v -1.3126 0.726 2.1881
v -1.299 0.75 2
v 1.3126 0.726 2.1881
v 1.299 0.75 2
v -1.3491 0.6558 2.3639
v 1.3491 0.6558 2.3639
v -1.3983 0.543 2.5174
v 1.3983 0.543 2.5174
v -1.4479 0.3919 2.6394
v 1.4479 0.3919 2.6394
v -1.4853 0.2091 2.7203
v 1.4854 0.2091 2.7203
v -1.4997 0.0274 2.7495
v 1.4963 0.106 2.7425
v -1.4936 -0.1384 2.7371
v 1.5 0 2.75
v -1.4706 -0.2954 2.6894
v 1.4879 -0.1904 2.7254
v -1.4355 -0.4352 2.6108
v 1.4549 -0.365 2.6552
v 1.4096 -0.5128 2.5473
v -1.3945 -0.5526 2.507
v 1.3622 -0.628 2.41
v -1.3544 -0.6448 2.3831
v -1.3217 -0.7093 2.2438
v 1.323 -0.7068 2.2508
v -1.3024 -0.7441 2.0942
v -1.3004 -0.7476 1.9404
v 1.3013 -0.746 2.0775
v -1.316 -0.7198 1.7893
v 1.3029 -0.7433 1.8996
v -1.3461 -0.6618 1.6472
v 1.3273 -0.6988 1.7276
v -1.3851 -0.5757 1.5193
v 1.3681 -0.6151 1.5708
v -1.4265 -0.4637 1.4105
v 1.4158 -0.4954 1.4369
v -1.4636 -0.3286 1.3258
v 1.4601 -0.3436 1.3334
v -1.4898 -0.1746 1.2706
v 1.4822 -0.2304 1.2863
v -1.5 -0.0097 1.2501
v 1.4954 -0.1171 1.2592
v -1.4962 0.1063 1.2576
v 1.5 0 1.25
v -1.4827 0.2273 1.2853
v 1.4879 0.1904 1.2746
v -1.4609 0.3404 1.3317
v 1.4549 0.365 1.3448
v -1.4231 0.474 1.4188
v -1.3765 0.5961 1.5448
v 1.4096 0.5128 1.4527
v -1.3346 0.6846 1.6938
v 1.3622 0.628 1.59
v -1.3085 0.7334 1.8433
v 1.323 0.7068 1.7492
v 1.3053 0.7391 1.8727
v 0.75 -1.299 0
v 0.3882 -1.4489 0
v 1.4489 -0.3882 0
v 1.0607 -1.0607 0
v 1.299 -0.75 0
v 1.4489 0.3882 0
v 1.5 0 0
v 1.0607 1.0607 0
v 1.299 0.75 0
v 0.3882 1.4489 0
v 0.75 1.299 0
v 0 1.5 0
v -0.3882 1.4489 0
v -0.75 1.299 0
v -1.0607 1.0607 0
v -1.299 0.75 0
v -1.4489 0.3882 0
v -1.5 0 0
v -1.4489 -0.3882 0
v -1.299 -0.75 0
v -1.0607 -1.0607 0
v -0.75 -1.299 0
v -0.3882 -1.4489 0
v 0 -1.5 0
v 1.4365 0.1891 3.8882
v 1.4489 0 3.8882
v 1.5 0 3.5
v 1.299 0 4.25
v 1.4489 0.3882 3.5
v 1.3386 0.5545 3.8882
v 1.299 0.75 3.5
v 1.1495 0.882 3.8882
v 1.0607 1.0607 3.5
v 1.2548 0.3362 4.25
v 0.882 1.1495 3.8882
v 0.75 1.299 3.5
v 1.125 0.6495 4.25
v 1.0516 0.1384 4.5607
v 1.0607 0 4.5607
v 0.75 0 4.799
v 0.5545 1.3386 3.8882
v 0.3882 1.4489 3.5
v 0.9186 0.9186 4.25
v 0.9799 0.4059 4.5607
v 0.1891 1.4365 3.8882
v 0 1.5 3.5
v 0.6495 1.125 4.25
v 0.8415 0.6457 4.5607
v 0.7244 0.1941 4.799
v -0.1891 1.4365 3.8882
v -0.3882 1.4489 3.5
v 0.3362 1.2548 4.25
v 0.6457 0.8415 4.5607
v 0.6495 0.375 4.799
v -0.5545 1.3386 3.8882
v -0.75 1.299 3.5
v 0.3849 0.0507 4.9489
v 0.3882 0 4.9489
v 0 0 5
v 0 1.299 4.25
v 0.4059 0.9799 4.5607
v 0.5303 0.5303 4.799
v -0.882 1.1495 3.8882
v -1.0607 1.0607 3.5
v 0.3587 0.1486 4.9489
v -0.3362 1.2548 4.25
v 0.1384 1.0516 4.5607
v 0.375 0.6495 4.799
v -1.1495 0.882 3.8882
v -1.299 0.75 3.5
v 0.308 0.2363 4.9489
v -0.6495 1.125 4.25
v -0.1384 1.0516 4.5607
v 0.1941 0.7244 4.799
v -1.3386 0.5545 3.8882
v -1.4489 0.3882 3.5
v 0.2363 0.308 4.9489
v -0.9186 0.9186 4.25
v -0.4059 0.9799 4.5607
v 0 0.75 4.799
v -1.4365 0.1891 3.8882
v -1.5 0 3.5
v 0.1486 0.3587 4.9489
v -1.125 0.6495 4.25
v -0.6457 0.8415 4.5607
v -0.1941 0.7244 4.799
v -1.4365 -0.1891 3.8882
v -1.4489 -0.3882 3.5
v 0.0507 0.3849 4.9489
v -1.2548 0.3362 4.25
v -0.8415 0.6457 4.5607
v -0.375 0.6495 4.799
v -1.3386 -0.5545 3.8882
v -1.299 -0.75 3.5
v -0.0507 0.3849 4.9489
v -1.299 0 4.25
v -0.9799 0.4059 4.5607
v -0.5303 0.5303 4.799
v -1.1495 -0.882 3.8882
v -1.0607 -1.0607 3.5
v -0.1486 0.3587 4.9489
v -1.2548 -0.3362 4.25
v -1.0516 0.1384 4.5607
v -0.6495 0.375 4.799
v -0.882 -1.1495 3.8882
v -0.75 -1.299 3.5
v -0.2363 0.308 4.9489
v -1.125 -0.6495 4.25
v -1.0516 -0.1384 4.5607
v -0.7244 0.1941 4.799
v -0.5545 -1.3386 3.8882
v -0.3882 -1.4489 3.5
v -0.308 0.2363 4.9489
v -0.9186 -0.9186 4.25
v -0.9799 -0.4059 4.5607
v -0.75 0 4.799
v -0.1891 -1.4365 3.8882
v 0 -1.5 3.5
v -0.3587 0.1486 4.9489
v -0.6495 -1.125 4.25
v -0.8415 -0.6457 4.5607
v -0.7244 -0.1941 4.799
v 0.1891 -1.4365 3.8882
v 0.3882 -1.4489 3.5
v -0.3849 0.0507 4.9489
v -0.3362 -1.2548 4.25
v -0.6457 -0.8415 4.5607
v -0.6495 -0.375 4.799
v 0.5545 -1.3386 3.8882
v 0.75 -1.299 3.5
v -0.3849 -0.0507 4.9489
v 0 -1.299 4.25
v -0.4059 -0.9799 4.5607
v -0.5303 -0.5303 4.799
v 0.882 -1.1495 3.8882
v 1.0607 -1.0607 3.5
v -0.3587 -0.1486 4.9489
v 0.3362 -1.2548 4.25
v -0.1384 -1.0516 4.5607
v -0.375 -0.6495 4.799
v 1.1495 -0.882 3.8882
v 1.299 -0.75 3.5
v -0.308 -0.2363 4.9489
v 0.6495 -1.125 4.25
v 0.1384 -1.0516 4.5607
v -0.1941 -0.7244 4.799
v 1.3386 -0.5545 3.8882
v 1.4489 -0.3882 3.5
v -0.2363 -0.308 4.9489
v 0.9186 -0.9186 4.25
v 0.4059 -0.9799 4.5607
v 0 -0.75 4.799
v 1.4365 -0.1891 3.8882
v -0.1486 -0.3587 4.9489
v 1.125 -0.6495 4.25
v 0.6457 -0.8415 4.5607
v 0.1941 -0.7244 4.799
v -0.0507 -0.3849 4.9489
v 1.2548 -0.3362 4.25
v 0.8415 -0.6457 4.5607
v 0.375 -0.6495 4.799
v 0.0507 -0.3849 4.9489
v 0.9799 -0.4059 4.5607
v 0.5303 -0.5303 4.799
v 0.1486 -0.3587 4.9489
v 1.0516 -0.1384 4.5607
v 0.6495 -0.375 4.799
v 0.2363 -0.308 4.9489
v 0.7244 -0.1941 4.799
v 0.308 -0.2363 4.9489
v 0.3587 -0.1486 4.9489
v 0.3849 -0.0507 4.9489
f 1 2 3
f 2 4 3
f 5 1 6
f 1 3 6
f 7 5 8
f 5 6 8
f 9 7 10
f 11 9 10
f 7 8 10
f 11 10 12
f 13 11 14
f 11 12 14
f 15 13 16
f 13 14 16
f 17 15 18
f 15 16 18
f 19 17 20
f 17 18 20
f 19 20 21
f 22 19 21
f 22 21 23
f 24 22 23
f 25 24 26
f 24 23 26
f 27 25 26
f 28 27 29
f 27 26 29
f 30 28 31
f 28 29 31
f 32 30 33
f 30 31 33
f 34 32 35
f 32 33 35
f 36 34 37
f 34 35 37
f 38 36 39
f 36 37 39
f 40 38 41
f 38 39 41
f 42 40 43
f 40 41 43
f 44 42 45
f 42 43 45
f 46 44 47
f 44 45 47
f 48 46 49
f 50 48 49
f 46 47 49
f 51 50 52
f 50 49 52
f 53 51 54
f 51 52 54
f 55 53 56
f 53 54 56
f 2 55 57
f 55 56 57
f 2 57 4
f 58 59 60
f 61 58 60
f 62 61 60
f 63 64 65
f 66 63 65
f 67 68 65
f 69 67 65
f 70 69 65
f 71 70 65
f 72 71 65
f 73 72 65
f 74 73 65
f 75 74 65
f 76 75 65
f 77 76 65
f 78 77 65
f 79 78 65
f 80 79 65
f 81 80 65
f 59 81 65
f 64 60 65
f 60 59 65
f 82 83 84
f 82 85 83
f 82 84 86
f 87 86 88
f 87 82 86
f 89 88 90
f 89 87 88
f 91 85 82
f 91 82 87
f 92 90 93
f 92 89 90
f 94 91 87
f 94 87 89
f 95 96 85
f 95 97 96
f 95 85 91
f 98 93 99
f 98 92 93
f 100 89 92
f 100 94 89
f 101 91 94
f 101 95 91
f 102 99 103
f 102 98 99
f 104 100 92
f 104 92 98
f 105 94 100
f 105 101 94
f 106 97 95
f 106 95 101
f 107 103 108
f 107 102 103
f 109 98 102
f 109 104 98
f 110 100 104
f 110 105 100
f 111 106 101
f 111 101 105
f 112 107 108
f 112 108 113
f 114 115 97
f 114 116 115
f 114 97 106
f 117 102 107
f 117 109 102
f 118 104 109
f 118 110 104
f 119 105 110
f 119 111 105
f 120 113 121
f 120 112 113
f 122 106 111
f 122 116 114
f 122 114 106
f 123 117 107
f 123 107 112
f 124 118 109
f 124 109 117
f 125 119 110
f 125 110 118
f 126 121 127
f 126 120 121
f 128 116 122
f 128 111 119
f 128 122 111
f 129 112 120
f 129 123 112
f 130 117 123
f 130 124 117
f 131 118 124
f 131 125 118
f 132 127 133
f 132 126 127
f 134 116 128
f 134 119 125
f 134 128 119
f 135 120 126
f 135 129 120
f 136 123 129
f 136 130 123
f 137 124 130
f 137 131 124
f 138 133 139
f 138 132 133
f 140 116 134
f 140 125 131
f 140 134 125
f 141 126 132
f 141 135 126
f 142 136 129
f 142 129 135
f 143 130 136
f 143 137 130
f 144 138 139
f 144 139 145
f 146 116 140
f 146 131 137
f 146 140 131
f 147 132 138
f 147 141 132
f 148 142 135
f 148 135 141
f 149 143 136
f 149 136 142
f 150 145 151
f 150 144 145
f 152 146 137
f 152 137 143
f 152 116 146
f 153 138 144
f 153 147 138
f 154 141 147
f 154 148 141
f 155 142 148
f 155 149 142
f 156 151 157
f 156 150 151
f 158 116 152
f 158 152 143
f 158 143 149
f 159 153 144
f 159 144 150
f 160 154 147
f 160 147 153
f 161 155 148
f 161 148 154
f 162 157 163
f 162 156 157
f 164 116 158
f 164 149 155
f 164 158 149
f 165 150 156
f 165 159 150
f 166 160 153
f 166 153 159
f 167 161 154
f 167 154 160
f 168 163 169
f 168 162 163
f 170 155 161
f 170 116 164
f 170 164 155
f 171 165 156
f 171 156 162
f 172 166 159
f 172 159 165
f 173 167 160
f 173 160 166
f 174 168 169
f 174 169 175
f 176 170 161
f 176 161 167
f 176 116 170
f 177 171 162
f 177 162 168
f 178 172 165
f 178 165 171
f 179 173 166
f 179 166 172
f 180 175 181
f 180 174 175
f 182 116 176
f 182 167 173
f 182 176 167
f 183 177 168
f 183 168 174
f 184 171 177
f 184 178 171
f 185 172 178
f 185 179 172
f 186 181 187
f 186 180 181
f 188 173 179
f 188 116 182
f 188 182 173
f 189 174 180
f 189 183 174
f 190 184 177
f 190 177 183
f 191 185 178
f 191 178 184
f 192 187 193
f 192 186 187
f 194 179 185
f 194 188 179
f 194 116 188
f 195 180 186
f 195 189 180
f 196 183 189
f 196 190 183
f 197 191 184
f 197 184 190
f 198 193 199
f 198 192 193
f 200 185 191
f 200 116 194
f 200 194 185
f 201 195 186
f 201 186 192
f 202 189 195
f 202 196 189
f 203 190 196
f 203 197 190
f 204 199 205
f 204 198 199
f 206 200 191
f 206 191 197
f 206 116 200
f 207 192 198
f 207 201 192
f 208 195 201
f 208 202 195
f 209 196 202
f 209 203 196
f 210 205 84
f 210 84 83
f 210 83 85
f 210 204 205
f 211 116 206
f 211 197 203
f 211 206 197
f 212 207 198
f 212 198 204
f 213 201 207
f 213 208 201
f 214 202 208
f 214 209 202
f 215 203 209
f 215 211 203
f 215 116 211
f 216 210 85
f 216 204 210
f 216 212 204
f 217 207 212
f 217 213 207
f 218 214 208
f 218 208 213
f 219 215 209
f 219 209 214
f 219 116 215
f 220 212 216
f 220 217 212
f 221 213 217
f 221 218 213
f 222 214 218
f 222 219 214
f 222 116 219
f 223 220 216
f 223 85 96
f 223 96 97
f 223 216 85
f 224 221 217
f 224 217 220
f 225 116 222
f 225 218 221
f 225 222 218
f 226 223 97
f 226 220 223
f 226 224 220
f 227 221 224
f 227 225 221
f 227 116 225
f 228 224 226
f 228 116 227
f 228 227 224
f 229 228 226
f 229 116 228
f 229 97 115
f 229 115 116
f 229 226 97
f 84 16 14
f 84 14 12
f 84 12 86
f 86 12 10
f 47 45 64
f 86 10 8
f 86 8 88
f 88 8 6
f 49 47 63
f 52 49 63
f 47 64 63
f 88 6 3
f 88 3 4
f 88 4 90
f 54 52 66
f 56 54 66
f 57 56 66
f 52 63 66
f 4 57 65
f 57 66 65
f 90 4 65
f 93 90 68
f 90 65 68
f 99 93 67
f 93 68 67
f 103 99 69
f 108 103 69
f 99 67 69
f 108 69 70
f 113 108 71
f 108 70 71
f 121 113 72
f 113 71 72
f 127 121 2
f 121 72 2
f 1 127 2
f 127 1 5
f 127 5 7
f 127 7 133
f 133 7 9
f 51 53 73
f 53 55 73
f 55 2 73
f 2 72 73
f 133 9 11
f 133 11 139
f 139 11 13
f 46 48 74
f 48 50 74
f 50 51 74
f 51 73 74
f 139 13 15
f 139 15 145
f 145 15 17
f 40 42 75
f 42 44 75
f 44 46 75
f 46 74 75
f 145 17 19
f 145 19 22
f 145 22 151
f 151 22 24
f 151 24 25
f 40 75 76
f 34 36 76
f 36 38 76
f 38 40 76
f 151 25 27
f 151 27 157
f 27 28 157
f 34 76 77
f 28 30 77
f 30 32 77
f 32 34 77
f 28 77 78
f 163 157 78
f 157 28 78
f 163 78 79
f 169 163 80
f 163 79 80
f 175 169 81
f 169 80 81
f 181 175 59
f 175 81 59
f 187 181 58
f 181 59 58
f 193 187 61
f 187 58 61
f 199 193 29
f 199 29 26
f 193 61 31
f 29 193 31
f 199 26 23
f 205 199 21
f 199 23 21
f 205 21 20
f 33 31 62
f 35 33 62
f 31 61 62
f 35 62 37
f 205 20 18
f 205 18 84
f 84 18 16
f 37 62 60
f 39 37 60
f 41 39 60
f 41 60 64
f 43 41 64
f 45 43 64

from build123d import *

# Parameters (mm, degrees)
F0_R     = 1.5
F1_DEPTH = 5
F2_R     = 1.5
F3_R     = 0.75
F4_DEPTH = 1.5


with BuildPart() as f1:
    # F0 (on Top) → F1 (new body)
    with BuildSketch(Plane.XY):
        Circle(F0_R)
    extrude(amount=F1_DEPTH)

    # F2
    f2_edges = [f1.edges().sort_by_distance(p)[0] for p in [
        (-1.5, 0, 5),
    ]]
    fillet(f2_edges, radius=F2_R)

    # F3 (on Right) → F4 (cut, symmetric)
    with BuildSketch(Plane.YZ):
        with Locations((0, 2)):
            Circle(F3_R)
    extrude(amount=F4_DEPTH, both=True, mode=Mode.SUBTRACT)


solid = f1.part
